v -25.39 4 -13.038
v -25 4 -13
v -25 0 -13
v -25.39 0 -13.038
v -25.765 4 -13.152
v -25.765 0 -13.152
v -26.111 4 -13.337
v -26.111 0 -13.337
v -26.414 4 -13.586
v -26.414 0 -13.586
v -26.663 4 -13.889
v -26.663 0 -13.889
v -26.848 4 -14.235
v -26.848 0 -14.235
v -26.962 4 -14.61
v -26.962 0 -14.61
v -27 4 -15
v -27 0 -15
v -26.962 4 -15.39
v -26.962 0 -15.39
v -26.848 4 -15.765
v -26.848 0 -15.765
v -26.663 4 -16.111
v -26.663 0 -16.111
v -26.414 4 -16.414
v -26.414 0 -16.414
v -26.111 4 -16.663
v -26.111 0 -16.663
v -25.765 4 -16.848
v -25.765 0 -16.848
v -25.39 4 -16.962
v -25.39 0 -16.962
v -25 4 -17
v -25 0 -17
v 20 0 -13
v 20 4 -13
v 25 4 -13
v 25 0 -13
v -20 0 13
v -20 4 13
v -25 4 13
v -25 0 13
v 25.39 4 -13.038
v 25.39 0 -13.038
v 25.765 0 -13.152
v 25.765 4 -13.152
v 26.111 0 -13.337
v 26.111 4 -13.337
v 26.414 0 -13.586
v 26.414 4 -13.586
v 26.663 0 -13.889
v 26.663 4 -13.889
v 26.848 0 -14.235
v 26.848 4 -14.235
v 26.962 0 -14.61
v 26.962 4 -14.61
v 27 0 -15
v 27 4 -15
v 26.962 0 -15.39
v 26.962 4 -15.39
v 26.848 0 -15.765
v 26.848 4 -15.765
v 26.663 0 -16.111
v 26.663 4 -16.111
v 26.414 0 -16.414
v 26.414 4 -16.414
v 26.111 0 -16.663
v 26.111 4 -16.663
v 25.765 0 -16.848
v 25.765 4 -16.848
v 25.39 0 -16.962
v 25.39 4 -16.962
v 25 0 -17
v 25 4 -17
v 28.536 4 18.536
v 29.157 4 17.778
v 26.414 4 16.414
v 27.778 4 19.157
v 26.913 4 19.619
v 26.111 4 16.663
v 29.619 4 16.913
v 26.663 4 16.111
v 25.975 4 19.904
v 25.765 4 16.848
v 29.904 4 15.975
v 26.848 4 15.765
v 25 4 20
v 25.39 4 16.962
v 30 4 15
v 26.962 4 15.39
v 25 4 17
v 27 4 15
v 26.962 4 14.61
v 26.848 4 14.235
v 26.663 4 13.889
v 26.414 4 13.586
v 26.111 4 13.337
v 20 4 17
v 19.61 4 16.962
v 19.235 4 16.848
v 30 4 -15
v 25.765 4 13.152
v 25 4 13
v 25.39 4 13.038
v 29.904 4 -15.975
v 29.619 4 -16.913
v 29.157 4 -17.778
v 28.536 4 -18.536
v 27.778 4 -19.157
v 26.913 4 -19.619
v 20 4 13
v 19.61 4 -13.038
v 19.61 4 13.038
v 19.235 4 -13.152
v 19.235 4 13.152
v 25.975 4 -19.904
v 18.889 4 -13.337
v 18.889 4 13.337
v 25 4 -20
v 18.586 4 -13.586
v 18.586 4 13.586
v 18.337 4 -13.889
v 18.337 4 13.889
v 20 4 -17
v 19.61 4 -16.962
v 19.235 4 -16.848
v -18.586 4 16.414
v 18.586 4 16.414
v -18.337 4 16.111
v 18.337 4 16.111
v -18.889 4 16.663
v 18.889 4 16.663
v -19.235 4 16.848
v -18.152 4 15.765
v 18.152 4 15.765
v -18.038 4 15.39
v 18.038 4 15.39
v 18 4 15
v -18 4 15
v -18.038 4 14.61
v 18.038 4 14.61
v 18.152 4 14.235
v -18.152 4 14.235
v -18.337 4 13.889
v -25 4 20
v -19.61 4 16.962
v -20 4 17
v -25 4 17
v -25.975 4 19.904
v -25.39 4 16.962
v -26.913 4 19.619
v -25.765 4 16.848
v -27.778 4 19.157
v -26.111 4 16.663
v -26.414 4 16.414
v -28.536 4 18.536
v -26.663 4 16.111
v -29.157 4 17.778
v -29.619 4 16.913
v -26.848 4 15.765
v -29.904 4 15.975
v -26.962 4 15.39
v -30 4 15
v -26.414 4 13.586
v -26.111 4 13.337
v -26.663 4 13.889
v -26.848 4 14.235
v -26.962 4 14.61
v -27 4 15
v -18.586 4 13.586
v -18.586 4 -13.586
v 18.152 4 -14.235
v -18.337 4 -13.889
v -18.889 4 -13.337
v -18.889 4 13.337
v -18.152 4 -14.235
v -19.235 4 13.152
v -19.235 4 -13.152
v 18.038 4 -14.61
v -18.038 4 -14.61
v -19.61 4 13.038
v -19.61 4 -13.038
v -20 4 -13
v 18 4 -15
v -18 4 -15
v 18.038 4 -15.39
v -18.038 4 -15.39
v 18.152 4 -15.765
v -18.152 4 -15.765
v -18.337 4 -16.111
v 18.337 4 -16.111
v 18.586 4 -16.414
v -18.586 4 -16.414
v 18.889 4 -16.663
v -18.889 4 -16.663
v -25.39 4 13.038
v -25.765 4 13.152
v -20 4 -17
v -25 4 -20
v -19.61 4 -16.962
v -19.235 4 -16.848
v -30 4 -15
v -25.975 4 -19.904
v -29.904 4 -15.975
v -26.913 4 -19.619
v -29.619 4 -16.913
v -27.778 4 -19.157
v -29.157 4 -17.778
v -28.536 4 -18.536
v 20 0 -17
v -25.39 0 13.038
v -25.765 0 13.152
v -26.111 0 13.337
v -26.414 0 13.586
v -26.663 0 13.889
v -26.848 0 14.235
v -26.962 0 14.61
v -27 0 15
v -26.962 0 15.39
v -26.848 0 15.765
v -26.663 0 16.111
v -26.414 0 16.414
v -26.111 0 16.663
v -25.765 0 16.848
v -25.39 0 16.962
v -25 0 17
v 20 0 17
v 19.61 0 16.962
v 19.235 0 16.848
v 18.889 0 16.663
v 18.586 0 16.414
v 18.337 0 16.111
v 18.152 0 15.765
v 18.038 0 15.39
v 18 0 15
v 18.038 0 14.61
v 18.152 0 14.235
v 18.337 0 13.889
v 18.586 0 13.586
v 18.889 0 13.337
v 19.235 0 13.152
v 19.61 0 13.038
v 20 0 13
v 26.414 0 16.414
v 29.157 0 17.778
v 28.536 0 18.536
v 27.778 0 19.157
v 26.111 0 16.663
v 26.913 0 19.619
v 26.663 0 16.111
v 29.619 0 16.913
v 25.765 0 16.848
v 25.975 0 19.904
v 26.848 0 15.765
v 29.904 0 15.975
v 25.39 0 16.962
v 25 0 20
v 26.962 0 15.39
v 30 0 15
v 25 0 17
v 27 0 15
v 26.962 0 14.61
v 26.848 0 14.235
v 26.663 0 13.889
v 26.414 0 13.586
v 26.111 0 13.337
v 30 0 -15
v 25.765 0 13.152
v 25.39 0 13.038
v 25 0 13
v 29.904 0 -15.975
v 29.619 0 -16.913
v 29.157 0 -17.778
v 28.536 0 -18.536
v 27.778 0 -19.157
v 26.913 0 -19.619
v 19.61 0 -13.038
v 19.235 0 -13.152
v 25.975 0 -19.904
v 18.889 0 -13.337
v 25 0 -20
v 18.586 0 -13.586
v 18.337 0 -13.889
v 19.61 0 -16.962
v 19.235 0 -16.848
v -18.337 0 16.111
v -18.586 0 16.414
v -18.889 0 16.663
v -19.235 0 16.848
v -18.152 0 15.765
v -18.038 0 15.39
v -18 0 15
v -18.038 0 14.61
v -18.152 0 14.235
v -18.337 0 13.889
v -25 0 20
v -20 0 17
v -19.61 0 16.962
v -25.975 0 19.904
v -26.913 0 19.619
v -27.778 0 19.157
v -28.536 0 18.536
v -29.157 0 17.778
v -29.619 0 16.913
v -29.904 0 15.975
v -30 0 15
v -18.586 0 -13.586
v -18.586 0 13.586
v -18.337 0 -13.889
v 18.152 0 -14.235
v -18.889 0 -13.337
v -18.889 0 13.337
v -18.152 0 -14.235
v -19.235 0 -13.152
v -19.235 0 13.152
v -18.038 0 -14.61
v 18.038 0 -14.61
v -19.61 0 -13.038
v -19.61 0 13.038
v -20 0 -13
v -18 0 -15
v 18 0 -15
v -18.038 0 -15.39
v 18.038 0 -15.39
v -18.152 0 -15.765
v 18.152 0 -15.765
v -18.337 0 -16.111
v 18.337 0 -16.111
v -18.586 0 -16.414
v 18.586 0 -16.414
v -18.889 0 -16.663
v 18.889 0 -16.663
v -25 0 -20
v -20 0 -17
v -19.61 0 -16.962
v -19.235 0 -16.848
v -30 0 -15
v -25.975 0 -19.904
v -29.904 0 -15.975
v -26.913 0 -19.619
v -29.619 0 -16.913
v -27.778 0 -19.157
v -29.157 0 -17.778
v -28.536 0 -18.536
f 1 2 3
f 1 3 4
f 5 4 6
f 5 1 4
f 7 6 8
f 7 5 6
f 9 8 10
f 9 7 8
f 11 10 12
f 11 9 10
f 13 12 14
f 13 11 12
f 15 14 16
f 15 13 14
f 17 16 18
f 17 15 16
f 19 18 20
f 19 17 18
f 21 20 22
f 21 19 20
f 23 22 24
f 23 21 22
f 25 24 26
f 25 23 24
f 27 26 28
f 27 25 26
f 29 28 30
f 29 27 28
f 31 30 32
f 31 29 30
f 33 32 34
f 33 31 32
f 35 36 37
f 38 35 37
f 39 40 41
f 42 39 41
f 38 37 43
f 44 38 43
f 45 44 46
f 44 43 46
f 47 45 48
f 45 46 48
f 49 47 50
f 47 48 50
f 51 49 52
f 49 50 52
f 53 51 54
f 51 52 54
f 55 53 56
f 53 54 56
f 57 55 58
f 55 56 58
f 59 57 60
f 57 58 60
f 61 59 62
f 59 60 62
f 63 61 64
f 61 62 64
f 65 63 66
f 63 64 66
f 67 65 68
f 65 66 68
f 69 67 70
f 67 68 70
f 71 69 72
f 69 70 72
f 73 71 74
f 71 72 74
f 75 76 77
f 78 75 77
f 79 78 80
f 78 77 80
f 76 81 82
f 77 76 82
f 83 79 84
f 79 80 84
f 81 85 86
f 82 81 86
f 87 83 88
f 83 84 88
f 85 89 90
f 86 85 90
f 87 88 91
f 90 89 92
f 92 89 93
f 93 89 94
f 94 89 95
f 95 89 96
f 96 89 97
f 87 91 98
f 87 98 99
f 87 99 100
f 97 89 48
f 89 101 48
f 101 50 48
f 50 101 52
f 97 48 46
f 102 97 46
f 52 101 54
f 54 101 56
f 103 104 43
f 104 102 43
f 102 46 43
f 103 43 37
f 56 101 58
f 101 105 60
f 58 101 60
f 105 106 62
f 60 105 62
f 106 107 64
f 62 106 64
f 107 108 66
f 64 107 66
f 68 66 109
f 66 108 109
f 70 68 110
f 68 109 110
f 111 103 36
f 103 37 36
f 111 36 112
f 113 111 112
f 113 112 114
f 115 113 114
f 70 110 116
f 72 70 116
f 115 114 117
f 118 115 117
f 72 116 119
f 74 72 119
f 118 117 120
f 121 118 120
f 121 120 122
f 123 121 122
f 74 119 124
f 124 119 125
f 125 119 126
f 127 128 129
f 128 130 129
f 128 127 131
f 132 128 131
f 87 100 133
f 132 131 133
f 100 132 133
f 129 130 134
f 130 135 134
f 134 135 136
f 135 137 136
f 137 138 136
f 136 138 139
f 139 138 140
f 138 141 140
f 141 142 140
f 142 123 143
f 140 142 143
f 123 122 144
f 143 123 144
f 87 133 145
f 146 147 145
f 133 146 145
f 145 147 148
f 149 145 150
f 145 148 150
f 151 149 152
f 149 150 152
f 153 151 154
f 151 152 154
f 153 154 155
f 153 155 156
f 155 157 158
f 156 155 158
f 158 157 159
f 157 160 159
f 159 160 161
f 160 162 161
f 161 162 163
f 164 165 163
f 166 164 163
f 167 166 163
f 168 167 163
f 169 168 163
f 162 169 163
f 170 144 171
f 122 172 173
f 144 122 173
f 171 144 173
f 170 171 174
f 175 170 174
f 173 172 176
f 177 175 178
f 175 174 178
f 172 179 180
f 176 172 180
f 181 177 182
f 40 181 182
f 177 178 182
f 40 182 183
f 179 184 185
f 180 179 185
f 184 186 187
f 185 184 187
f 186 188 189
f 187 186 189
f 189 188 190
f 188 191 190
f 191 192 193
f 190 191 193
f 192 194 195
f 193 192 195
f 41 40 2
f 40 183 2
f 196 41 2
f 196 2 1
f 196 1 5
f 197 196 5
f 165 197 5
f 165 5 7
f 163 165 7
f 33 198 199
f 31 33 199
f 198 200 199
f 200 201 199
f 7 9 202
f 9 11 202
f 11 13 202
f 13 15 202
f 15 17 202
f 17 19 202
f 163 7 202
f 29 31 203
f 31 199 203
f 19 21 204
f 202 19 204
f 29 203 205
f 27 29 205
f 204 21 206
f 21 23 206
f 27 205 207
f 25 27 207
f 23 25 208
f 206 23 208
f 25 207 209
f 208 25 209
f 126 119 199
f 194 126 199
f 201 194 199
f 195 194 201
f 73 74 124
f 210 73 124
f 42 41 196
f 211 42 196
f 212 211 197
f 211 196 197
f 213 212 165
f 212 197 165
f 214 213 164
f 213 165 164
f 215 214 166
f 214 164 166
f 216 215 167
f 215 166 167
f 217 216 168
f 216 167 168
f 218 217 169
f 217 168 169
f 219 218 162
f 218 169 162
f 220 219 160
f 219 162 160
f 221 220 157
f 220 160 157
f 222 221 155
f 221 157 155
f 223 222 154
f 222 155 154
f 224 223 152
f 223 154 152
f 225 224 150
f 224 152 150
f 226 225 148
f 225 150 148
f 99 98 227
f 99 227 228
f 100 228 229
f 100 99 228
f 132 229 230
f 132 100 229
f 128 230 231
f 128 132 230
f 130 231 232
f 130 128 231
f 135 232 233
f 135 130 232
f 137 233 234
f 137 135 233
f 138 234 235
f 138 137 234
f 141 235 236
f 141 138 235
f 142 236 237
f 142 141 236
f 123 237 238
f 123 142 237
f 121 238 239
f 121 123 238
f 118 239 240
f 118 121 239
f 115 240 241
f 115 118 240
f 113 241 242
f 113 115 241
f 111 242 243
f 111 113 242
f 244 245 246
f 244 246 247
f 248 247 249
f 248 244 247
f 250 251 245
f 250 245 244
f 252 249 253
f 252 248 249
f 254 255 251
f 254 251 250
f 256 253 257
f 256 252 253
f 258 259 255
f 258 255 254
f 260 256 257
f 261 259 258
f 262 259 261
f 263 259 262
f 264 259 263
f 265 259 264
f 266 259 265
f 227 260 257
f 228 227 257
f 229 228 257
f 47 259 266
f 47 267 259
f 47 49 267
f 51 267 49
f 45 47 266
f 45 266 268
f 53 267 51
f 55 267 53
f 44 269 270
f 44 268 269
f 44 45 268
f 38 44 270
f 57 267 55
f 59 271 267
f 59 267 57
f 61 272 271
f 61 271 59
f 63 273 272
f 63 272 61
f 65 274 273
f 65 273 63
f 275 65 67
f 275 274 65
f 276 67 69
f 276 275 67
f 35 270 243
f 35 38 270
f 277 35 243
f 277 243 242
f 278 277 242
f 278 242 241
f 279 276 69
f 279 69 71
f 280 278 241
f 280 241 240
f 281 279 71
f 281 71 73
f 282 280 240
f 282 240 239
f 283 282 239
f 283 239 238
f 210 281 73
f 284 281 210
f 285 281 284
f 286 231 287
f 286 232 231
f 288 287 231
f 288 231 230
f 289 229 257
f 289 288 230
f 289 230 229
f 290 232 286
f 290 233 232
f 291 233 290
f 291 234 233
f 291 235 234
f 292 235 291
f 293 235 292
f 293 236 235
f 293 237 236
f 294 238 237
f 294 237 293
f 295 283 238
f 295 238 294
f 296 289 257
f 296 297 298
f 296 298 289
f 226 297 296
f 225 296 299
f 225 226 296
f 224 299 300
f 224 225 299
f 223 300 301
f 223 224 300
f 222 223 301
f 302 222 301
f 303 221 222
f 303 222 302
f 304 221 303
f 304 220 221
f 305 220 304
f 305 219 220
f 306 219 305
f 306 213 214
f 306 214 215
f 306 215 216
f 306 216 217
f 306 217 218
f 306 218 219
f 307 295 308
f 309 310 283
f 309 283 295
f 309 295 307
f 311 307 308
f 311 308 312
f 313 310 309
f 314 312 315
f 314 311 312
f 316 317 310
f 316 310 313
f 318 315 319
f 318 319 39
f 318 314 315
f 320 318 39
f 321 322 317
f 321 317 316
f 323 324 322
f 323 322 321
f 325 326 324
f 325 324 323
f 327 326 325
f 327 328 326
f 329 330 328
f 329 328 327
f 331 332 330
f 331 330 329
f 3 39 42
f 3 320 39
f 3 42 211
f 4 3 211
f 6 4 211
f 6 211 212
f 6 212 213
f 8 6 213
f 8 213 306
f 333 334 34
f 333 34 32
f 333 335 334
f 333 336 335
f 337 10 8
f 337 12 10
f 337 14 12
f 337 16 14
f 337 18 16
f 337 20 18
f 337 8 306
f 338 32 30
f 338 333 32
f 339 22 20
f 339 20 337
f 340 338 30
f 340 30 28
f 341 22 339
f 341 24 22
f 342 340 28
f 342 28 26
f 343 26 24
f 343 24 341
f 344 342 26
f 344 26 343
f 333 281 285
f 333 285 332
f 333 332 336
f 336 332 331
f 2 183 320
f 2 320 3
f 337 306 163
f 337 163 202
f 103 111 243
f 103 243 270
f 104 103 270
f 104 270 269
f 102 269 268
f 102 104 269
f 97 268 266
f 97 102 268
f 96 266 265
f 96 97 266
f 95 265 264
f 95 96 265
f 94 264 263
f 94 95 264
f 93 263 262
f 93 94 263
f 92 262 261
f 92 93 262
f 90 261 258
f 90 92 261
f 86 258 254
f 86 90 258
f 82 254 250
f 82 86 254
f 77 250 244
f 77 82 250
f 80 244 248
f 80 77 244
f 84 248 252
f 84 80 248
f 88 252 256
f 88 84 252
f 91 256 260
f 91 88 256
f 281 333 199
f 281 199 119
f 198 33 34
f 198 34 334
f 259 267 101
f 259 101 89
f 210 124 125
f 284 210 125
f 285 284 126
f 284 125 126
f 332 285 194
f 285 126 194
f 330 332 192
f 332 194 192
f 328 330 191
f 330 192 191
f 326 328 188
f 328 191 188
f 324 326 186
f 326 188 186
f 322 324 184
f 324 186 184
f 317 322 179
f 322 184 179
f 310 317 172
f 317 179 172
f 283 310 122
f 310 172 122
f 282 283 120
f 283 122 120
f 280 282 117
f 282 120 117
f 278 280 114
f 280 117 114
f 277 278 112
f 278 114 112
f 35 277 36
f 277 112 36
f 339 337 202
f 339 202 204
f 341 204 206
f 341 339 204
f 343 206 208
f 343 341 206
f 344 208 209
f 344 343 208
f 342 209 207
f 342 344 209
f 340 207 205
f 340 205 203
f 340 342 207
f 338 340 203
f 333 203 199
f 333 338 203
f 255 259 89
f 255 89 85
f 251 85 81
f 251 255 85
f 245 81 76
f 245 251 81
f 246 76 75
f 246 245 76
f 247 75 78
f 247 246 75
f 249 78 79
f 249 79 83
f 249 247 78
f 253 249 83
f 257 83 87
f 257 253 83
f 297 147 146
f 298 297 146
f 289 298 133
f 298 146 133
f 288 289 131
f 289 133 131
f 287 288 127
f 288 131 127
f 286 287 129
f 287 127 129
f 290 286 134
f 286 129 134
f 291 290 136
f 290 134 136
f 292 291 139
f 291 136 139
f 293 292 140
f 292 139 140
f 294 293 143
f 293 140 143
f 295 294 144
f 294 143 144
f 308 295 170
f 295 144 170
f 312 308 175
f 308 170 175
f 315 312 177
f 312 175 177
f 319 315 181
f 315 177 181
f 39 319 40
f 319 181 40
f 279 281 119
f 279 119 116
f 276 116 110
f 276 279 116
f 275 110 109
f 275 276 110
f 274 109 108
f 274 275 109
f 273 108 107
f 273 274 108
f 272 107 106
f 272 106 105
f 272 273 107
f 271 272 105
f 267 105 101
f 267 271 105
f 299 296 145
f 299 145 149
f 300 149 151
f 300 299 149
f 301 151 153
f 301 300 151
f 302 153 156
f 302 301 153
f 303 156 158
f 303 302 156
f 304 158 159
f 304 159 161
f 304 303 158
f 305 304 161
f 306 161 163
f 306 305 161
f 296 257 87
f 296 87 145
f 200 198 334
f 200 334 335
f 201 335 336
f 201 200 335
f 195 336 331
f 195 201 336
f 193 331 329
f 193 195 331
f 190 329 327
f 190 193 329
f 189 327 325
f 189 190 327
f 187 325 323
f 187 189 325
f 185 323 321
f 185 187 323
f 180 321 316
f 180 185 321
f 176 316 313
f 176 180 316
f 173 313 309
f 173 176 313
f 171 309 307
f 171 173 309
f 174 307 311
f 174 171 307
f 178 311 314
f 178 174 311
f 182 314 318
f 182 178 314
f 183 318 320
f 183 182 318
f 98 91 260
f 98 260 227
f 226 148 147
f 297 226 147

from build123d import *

# Parameters (mm, degrees)
BOSS_EXTRUDE1_DEPTH = 4
CUT_EXTRUDE1_DEPTH  = 4


with BuildPart() as part:
    # Sketch1 → Boss-Extrude1 (new body)
    with BuildSketch(Plane(origin=(0, 0, 0), x_dir=(1, 0, 0), z_dir=(0, 1, 0))):
        with BuildLine():
            Line((25, -20), (-25, -20))
            ThreePointArc((-25, -20), (-28.535533906, -18.535533906), (-30, -15))
            Line((-30, -15), (-30, 15))
            ThreePointArc((-30, 15), (-28.535533906, 18.535533906), (-25, 20))
            Line((-25, 20), (25, 20))
            ThreePointArc((25, 20), (28.535533906, 18.535533906), (30, 15))
            Line((30, 15), (30, -15))
            ThreePointArc((30, -15), (28.535533906, -18.535533906), (25, -20))
        make_face()
    extrude(amount=BOSS_EXTRUDE1_DEPTH)

    # Sketch2 → Cut-Extrude1 (cut)
    with BuildSketch(Plane(origin=(0, 4, 0), x_dir=(1, 0, 0), z_dir=(0, 1, 0))):
        with BuildLine():
            Line((-25, 17), (-20, 17))
            ThreePointArc((-20, 17), (-18, 15), (-20, 13))
            Line((-20, 13), (-25, 13))
            ThreePointArc((-25, 13), (-27, 15), (-25, 17))
        make_face()
        with BuildLine():
            Line((25, 17), (20, 17))
            ThreePointArc((20, 17), (18, 15), (20, 13))
            Line((20, 13), (25, 13))
            ThreePointArc((25, 13), (27, 15), (25, 17))
        make_face()
        with BuildLine():
            Line((25, -17), (20, -17))
            ThreePointArc((20, -17), (18, -15), (20, -13))
            Line((20, -13), (25, -13))
            ThreePointArc((25, -13), (27, -15), (25, -17))
        make_face()
        with BuildLine():
            Line((-25, -17), (-20, -17))
            ThreePointArc((-20, -17), (-18, -15), (-20, -13))
            Line((-20, -13), (-25, -13))
            ThreePointArc((-25, -13), (-27, -15), (-25, -17))
        make_face()
    extrude(amount=-CUT_EXTRUDE1_DEPTH, mode=Mode.SUBTRACT)


solid = part.part
